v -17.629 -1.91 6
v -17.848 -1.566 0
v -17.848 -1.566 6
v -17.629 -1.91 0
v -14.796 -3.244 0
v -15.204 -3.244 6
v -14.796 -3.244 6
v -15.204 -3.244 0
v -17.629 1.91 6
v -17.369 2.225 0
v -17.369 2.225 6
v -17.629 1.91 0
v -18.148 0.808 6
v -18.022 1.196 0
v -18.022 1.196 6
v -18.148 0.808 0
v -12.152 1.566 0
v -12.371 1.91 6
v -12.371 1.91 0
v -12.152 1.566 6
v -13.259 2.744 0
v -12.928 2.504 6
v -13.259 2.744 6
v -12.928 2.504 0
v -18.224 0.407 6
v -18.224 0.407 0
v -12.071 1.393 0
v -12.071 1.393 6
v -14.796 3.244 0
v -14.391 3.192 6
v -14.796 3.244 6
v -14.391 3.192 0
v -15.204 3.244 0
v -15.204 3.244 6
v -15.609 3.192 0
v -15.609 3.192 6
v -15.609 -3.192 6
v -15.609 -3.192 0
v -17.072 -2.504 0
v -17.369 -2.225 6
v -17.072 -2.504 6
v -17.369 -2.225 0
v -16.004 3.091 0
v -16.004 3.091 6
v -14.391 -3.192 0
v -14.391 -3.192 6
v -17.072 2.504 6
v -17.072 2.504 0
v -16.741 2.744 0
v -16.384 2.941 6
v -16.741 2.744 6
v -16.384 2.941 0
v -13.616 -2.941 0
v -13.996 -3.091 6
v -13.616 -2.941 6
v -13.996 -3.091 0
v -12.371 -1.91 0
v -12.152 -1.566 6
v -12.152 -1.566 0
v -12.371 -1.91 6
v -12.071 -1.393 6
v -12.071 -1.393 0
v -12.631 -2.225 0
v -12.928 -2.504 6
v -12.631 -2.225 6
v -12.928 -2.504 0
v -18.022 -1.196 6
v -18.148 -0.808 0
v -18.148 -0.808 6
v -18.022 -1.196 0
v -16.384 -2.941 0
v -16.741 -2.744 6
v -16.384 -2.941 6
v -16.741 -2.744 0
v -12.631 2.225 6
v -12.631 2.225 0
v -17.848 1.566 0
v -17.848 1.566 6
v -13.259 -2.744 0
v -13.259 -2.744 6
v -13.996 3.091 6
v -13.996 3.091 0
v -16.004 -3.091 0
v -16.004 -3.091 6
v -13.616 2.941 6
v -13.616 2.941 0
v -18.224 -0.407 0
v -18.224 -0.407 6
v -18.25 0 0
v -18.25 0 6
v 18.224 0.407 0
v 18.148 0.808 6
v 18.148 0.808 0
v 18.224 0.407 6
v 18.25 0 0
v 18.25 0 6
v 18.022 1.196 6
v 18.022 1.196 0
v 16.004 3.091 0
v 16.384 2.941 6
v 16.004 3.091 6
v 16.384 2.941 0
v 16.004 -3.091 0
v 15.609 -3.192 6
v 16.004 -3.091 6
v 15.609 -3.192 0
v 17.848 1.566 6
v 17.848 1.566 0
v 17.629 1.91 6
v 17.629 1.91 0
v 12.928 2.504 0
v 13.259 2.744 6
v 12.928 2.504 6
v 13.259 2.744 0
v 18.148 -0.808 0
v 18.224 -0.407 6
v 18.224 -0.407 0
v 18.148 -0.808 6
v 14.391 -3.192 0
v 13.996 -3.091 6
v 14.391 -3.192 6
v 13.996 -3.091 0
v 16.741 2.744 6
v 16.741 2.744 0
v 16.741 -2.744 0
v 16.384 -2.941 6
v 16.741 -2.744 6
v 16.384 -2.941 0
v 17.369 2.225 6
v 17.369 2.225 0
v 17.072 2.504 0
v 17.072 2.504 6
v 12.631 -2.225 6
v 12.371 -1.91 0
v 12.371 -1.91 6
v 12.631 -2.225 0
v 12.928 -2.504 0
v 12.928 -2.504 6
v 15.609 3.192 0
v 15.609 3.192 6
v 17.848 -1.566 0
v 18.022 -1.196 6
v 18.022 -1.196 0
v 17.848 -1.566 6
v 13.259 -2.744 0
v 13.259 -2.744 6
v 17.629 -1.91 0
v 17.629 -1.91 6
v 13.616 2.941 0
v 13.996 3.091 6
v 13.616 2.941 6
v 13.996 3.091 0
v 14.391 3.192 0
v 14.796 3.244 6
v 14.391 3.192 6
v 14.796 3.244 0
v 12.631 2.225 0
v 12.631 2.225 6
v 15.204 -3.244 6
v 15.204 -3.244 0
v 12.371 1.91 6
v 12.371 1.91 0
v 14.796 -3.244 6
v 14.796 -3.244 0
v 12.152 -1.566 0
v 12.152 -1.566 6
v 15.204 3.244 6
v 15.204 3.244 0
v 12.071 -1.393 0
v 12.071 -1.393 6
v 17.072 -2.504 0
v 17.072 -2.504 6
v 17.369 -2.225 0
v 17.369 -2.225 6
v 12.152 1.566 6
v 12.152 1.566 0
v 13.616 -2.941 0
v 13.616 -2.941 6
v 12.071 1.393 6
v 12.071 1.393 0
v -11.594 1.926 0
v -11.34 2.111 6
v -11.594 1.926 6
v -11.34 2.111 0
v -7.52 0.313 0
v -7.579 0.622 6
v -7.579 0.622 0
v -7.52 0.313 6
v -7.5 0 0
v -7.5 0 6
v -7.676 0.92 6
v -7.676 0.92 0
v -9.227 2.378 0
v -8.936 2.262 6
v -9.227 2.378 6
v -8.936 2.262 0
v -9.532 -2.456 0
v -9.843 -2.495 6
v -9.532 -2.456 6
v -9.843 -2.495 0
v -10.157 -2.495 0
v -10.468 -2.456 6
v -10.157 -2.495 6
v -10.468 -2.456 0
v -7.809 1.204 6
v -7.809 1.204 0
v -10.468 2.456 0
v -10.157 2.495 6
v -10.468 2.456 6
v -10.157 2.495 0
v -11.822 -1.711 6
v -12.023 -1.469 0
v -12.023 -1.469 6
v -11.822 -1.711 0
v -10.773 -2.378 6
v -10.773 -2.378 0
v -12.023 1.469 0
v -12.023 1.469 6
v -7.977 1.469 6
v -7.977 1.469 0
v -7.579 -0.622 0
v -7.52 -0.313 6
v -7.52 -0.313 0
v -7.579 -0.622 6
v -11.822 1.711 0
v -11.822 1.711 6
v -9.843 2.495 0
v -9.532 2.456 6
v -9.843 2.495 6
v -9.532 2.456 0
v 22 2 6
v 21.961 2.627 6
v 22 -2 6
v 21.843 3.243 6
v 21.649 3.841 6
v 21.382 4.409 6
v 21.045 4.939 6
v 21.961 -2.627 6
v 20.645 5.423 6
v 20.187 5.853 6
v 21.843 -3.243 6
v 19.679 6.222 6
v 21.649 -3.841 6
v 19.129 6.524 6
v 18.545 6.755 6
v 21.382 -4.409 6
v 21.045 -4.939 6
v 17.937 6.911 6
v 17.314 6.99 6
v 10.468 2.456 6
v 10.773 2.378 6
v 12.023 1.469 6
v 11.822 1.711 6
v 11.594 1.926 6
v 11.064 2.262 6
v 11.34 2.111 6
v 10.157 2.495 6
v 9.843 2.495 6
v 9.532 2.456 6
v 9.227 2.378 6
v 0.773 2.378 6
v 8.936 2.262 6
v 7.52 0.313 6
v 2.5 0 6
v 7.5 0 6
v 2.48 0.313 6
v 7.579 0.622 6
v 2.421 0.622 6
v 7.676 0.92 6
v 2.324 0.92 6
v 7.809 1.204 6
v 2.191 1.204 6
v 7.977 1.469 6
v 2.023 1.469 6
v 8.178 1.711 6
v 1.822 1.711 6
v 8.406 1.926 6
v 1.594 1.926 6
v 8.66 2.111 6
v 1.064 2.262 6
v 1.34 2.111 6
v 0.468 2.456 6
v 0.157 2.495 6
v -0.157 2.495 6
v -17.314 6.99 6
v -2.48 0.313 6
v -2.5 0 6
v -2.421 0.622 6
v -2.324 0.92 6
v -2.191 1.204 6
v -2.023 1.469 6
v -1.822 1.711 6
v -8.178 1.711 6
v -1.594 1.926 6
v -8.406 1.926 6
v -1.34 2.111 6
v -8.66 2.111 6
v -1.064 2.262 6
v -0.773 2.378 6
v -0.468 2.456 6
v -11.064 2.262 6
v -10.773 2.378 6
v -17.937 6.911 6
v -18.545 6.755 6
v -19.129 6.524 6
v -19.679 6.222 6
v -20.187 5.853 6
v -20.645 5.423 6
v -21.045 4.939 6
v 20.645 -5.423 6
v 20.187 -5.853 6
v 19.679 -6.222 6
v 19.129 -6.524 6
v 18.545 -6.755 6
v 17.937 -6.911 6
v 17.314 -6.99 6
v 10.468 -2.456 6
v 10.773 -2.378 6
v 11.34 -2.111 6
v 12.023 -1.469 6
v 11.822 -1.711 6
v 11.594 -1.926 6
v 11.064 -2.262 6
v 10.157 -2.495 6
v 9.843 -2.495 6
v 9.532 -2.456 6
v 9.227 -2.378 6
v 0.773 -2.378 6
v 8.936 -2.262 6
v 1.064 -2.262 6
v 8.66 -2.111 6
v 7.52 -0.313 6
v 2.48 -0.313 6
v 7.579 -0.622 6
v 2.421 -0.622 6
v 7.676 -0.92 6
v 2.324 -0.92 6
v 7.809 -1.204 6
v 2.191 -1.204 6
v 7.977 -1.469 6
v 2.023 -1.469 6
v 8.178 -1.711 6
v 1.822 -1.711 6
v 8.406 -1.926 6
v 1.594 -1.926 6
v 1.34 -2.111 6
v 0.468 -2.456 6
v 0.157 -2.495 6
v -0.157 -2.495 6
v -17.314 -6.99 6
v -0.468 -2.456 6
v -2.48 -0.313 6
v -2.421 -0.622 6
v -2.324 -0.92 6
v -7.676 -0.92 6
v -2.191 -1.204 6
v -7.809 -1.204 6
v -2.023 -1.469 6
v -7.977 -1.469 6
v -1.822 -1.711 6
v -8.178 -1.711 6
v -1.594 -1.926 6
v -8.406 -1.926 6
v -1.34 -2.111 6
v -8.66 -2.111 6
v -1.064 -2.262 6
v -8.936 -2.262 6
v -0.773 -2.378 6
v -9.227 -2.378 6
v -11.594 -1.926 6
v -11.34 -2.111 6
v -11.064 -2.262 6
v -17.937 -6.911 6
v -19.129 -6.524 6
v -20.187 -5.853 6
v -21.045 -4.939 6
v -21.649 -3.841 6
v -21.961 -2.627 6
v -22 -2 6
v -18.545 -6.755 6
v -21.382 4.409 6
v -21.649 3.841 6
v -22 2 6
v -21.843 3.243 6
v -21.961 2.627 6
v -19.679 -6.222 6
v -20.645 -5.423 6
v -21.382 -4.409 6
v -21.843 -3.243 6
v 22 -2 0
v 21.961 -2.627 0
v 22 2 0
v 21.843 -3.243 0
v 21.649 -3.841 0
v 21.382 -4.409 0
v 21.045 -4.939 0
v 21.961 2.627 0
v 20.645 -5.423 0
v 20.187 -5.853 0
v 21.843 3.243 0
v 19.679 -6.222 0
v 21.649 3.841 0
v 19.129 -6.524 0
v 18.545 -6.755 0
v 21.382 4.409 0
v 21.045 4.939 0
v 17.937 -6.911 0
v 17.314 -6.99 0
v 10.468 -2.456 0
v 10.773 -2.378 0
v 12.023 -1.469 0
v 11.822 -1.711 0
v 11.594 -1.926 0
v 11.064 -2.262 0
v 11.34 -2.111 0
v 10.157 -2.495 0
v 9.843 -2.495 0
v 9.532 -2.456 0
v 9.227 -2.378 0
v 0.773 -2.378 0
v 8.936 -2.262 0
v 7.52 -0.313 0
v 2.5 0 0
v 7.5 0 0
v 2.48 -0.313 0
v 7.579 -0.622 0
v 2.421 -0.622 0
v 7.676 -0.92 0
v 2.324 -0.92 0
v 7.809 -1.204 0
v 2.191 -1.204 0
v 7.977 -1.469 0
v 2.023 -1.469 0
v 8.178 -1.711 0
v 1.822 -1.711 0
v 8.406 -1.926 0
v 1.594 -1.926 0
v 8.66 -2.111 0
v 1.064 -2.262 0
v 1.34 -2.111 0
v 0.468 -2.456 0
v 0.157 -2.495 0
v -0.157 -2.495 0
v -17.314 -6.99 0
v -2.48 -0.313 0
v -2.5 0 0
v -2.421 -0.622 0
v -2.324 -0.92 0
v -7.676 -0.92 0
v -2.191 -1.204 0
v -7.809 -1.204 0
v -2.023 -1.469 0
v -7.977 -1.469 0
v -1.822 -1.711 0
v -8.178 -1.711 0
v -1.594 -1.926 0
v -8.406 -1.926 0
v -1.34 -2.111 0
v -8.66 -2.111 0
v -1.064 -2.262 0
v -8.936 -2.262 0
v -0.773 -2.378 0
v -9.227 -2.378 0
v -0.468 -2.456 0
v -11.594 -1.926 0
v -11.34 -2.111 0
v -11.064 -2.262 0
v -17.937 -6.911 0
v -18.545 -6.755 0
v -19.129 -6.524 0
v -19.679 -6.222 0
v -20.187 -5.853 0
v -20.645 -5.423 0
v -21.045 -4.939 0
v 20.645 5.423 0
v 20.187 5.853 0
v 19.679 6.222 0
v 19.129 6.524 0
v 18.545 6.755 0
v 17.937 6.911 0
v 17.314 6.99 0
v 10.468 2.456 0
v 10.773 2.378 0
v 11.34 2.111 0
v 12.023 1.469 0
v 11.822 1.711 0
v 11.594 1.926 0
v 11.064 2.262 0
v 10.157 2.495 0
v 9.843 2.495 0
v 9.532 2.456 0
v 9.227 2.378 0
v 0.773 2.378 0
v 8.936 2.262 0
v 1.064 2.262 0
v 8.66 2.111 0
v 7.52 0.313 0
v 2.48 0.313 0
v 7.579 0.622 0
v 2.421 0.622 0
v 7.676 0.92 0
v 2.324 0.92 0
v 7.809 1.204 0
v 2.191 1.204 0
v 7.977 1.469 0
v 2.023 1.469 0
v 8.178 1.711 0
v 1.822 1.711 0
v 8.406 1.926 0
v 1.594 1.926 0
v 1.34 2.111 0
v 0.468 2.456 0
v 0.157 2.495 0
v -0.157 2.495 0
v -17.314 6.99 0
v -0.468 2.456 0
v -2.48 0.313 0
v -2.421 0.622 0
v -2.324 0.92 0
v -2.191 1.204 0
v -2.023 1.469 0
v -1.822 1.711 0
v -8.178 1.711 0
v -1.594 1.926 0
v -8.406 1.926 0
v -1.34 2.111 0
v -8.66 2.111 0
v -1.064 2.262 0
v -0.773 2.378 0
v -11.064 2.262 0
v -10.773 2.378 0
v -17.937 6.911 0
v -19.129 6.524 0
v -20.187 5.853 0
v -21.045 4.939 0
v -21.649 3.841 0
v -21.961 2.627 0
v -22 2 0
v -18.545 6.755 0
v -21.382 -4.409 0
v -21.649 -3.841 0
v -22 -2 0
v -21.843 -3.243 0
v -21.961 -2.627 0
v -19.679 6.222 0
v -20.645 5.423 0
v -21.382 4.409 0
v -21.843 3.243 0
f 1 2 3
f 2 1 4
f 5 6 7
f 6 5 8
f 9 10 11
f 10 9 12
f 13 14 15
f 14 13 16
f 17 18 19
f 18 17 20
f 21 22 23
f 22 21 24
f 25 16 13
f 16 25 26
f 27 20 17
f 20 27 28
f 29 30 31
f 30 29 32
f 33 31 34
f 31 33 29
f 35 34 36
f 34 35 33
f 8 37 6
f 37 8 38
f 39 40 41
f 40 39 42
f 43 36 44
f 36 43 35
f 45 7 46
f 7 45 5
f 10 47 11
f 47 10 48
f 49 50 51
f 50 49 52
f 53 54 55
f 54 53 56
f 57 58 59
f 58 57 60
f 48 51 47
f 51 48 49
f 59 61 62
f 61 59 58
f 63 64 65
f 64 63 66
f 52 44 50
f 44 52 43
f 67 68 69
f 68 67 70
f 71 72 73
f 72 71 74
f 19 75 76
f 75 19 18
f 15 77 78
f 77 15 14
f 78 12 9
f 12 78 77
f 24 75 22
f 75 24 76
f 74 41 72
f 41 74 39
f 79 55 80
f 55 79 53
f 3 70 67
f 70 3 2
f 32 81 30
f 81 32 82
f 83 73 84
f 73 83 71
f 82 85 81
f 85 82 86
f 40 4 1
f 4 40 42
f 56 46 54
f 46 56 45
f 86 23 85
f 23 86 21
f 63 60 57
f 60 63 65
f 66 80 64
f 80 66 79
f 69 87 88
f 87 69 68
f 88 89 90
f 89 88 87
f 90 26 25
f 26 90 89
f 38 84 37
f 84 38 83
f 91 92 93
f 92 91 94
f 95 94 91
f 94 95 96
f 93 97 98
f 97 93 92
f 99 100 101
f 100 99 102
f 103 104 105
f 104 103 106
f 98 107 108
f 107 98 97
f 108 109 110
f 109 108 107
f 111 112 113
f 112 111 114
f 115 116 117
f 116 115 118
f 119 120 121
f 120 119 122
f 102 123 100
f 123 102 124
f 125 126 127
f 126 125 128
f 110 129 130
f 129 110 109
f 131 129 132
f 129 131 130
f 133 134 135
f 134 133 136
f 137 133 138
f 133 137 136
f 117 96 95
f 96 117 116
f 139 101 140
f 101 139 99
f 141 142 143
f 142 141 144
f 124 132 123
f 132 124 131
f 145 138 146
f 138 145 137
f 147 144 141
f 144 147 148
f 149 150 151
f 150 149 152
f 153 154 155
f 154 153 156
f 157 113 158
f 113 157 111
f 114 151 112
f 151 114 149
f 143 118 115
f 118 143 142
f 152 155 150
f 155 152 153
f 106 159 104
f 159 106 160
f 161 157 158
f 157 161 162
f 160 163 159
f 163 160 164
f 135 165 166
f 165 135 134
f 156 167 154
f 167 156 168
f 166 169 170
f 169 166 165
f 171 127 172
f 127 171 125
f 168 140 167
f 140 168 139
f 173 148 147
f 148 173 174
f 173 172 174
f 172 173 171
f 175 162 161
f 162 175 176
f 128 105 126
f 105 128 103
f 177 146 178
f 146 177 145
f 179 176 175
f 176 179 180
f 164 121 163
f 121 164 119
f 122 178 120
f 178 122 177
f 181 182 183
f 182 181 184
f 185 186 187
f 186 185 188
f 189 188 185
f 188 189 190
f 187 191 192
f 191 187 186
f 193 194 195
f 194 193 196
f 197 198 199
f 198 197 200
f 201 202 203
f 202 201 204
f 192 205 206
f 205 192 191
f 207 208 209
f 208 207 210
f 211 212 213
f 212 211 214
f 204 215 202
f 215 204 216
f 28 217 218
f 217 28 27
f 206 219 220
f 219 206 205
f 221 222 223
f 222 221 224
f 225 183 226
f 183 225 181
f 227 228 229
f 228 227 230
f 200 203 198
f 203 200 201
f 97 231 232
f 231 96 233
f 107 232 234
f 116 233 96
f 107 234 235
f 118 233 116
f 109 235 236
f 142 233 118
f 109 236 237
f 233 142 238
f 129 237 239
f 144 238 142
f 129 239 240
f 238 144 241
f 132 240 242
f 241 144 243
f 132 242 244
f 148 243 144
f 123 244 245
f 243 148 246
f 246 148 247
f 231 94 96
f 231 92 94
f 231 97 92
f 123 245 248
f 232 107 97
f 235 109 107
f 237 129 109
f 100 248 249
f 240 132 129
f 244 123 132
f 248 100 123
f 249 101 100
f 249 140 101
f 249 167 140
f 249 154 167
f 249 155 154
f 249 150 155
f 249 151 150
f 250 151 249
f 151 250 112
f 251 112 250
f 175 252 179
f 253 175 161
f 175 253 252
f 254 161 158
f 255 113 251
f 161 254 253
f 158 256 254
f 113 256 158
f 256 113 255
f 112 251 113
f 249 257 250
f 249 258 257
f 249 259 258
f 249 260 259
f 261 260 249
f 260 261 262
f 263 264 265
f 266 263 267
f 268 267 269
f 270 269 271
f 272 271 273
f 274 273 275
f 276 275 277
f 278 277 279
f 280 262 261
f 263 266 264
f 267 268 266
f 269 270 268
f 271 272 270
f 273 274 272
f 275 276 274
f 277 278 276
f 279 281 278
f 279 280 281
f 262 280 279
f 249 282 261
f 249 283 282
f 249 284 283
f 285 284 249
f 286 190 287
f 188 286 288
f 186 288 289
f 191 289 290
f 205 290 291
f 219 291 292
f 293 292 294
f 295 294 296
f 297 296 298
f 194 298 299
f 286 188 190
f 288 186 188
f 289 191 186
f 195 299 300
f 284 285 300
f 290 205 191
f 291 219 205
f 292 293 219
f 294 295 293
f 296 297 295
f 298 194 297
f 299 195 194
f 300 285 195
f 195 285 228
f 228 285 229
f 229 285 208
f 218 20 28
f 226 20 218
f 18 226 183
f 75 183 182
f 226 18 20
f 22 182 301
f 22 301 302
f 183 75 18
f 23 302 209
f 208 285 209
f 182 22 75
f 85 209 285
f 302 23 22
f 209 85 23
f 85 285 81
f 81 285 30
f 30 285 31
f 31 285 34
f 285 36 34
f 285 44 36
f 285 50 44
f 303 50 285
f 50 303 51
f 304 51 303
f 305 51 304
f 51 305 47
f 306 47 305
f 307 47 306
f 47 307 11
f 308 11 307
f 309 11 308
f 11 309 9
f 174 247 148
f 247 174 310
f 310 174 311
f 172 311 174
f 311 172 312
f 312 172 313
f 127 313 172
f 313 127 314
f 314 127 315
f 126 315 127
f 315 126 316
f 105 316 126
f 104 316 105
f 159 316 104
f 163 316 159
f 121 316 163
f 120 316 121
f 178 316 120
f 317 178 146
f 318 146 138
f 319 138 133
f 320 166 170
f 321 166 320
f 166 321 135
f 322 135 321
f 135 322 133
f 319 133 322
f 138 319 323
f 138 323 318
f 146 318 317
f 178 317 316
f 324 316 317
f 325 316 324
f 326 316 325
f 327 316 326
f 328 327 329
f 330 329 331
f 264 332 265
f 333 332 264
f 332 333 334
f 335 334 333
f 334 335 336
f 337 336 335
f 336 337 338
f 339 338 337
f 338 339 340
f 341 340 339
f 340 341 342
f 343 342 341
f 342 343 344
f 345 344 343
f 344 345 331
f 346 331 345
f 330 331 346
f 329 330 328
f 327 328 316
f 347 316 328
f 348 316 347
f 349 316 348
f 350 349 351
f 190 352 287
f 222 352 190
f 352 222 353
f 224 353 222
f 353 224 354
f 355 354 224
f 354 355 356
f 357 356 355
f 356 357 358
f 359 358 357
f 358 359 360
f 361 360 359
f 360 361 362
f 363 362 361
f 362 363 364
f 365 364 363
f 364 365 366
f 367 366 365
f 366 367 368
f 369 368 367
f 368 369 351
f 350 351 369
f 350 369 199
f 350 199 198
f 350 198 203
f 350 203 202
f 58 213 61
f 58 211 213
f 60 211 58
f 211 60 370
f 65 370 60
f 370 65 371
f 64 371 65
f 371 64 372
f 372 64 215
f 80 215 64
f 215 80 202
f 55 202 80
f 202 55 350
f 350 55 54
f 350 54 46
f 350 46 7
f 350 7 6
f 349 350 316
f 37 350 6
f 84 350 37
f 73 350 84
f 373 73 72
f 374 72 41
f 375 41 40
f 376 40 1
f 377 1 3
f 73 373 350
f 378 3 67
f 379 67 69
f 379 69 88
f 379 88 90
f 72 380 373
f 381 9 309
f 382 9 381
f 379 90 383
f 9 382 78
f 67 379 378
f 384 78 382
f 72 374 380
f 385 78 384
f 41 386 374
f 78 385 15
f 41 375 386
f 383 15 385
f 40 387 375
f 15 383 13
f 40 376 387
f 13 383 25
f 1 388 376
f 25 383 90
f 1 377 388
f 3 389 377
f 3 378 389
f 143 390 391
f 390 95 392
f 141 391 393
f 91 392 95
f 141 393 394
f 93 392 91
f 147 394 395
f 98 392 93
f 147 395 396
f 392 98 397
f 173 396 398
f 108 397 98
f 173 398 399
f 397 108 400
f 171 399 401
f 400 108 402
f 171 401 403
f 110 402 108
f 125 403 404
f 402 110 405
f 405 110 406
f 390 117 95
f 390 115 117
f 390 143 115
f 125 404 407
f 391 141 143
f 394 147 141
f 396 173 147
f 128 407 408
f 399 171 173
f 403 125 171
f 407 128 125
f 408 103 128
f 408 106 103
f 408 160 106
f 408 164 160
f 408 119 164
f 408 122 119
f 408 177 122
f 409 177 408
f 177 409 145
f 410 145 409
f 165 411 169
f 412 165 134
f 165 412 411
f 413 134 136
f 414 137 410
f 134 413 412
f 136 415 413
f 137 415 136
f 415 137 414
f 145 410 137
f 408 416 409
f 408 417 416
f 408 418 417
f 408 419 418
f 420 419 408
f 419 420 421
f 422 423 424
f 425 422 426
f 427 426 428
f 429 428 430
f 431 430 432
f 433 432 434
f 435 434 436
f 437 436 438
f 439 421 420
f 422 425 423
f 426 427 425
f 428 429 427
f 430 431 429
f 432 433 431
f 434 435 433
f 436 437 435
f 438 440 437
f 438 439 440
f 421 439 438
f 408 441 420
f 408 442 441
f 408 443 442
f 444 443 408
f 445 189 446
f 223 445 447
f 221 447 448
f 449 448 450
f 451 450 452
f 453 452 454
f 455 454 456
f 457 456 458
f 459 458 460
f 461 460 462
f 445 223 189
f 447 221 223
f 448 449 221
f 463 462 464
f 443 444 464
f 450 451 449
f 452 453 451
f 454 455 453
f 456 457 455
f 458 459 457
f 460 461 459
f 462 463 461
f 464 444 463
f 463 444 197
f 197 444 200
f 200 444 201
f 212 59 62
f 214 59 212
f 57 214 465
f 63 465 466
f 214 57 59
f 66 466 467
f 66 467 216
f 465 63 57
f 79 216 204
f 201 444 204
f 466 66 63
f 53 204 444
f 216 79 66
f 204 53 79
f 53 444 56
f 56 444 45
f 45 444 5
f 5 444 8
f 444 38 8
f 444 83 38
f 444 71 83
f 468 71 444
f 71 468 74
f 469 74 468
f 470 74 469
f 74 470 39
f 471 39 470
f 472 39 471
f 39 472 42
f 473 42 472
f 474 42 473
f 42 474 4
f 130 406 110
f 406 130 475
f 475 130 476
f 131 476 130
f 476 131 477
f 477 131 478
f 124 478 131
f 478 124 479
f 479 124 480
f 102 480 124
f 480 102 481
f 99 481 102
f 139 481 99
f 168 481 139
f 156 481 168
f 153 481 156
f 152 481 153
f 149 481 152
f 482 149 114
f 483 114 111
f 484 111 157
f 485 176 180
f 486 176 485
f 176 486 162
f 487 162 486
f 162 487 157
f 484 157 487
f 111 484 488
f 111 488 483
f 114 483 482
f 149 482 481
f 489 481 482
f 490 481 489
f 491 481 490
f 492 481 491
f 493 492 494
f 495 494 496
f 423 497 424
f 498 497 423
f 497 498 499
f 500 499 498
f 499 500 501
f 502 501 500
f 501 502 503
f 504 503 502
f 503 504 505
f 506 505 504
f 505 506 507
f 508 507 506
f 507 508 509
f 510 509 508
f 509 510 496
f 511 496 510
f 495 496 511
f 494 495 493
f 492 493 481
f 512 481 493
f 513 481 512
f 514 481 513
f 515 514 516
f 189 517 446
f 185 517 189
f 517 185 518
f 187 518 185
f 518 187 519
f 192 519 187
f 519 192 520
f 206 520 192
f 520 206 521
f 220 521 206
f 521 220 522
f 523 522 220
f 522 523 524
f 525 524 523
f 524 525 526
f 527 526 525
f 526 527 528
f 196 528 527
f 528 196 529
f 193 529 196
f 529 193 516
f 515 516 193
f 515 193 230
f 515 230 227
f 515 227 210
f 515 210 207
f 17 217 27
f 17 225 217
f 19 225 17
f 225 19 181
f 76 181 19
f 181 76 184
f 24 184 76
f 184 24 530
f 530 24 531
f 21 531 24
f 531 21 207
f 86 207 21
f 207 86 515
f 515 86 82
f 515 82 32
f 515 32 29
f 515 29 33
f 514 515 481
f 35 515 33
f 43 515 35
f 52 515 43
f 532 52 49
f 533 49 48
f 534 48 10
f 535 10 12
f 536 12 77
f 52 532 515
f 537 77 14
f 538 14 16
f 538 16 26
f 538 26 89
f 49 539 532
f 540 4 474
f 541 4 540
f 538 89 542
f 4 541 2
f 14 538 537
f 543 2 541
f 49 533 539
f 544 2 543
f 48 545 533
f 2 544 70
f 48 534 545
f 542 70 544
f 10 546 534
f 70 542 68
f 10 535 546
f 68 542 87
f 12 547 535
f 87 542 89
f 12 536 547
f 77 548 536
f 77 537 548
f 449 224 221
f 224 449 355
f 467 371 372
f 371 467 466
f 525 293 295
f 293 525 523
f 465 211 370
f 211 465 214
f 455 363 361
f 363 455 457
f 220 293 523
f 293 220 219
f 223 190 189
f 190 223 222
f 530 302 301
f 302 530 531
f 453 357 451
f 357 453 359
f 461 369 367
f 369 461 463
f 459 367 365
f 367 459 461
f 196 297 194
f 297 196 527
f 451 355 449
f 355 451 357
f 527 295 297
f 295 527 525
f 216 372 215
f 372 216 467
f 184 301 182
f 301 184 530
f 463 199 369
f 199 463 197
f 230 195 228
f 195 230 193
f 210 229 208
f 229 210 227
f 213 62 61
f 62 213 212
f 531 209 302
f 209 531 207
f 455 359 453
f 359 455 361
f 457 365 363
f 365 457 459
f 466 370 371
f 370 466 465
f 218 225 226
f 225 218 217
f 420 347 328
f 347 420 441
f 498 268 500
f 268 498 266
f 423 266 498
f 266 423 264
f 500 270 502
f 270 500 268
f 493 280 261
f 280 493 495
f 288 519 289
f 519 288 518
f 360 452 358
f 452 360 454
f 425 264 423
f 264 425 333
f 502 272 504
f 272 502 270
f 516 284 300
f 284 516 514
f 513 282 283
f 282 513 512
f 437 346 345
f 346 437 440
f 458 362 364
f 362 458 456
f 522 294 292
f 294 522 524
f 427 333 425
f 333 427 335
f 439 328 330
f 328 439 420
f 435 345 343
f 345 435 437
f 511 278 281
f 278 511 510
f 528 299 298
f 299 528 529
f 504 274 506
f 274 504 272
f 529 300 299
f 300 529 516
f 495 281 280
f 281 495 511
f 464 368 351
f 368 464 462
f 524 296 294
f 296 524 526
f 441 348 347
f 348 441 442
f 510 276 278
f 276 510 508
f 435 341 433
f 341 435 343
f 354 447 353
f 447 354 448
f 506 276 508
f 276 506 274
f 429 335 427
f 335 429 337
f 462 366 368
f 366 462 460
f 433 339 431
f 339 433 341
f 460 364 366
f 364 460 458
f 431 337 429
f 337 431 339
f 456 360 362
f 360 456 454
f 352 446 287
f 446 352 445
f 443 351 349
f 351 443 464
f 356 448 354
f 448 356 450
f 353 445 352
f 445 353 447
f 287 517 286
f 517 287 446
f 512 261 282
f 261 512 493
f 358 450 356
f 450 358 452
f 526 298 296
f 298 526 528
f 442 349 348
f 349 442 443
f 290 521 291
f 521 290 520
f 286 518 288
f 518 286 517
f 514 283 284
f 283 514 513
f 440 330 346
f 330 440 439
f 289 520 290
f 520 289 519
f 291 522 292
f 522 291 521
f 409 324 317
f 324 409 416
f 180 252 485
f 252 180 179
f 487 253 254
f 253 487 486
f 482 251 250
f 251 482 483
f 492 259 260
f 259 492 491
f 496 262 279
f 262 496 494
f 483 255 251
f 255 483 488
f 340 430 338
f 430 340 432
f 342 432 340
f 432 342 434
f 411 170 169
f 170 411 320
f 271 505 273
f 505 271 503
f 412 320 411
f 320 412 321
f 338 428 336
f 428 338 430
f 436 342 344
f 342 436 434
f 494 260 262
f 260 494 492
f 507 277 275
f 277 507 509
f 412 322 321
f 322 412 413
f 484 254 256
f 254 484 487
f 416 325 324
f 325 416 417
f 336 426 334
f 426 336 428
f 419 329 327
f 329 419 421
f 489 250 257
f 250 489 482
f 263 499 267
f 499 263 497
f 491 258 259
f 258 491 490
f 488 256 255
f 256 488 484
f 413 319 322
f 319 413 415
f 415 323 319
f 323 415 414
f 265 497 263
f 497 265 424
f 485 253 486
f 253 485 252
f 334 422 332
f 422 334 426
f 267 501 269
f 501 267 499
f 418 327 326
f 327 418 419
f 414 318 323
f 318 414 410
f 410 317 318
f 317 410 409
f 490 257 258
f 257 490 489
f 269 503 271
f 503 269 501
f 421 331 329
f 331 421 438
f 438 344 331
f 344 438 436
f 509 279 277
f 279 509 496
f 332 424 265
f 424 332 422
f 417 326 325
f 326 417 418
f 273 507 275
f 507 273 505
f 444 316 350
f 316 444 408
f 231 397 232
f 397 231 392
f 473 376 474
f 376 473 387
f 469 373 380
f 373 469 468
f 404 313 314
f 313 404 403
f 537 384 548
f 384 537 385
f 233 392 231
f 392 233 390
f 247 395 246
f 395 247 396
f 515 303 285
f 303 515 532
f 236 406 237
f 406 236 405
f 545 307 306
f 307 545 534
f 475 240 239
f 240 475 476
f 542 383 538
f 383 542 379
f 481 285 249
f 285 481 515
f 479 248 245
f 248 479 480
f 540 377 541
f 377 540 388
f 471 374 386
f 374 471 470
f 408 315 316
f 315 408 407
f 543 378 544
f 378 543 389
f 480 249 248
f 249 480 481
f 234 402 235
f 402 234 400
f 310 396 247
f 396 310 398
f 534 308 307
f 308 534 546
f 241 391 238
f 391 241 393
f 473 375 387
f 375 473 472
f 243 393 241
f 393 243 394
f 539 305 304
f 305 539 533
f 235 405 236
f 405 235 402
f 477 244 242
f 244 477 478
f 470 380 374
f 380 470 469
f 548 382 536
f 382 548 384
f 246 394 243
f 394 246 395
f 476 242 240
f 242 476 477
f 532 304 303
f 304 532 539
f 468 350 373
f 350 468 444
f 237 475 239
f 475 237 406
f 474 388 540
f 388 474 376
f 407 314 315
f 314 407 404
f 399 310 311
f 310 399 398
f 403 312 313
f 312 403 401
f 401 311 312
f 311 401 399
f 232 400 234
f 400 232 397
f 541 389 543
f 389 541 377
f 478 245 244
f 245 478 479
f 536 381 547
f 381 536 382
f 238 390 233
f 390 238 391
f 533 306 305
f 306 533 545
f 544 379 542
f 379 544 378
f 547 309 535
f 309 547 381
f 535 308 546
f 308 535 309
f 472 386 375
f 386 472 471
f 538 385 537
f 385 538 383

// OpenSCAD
$fn = 50;


difference() {
	union() {
		hull() {
			translate(v = [-17.0000000000, 2.0000000000, 0]) {
				cylinder(h = 6, r = 5);
			}
			translate(v = [17.0000000000, 2.0000000000, 0]) {
				cylinder(h = 6, r = 5);
			}
			translate(v = [-17.0000000000, -2.0000000000, 0]) {
				cylinder(h = 6, r = 5);
			}
			translate(v = [17.0000000000, -2.0000000000, 0]) {
				cylinder(h = 6, r = 5);
			}
		}
	}
	union() {
		#translate(v = [-15.0000000000, 0.0000000000, -100.0000000000]) {
			cylinder(h = 200, r = 3.2500000000);
		}
		#translate(v = [-15.0000000000, 0.0000000000, -100.0000000000]) {
			cylinder(h = 200, r = 3.2500000000);
		}
		#translate(v = [15.0000000000, 0.0000000000, -100.0000000000]) {
			cylinder(h = 200, r = 3.2500000000);
		}
		#translate(v = [15.0000000000, 0.0000000000, -100.0000000000]) {
			cylinder(h = 200, r = 3.2500000000);
		}
		#translate(v = [-10.0000000000, 0, 0]) {
			cylinder(h = 6, r = 2.5000000000);
		}
		#cylinder(h = 6, r = 2.5000000000);
		#translate(v = [10.0000000000, 0, 0]) {
			cylinder(h = 6, r = 2.5000000000);
		}
	}
}
